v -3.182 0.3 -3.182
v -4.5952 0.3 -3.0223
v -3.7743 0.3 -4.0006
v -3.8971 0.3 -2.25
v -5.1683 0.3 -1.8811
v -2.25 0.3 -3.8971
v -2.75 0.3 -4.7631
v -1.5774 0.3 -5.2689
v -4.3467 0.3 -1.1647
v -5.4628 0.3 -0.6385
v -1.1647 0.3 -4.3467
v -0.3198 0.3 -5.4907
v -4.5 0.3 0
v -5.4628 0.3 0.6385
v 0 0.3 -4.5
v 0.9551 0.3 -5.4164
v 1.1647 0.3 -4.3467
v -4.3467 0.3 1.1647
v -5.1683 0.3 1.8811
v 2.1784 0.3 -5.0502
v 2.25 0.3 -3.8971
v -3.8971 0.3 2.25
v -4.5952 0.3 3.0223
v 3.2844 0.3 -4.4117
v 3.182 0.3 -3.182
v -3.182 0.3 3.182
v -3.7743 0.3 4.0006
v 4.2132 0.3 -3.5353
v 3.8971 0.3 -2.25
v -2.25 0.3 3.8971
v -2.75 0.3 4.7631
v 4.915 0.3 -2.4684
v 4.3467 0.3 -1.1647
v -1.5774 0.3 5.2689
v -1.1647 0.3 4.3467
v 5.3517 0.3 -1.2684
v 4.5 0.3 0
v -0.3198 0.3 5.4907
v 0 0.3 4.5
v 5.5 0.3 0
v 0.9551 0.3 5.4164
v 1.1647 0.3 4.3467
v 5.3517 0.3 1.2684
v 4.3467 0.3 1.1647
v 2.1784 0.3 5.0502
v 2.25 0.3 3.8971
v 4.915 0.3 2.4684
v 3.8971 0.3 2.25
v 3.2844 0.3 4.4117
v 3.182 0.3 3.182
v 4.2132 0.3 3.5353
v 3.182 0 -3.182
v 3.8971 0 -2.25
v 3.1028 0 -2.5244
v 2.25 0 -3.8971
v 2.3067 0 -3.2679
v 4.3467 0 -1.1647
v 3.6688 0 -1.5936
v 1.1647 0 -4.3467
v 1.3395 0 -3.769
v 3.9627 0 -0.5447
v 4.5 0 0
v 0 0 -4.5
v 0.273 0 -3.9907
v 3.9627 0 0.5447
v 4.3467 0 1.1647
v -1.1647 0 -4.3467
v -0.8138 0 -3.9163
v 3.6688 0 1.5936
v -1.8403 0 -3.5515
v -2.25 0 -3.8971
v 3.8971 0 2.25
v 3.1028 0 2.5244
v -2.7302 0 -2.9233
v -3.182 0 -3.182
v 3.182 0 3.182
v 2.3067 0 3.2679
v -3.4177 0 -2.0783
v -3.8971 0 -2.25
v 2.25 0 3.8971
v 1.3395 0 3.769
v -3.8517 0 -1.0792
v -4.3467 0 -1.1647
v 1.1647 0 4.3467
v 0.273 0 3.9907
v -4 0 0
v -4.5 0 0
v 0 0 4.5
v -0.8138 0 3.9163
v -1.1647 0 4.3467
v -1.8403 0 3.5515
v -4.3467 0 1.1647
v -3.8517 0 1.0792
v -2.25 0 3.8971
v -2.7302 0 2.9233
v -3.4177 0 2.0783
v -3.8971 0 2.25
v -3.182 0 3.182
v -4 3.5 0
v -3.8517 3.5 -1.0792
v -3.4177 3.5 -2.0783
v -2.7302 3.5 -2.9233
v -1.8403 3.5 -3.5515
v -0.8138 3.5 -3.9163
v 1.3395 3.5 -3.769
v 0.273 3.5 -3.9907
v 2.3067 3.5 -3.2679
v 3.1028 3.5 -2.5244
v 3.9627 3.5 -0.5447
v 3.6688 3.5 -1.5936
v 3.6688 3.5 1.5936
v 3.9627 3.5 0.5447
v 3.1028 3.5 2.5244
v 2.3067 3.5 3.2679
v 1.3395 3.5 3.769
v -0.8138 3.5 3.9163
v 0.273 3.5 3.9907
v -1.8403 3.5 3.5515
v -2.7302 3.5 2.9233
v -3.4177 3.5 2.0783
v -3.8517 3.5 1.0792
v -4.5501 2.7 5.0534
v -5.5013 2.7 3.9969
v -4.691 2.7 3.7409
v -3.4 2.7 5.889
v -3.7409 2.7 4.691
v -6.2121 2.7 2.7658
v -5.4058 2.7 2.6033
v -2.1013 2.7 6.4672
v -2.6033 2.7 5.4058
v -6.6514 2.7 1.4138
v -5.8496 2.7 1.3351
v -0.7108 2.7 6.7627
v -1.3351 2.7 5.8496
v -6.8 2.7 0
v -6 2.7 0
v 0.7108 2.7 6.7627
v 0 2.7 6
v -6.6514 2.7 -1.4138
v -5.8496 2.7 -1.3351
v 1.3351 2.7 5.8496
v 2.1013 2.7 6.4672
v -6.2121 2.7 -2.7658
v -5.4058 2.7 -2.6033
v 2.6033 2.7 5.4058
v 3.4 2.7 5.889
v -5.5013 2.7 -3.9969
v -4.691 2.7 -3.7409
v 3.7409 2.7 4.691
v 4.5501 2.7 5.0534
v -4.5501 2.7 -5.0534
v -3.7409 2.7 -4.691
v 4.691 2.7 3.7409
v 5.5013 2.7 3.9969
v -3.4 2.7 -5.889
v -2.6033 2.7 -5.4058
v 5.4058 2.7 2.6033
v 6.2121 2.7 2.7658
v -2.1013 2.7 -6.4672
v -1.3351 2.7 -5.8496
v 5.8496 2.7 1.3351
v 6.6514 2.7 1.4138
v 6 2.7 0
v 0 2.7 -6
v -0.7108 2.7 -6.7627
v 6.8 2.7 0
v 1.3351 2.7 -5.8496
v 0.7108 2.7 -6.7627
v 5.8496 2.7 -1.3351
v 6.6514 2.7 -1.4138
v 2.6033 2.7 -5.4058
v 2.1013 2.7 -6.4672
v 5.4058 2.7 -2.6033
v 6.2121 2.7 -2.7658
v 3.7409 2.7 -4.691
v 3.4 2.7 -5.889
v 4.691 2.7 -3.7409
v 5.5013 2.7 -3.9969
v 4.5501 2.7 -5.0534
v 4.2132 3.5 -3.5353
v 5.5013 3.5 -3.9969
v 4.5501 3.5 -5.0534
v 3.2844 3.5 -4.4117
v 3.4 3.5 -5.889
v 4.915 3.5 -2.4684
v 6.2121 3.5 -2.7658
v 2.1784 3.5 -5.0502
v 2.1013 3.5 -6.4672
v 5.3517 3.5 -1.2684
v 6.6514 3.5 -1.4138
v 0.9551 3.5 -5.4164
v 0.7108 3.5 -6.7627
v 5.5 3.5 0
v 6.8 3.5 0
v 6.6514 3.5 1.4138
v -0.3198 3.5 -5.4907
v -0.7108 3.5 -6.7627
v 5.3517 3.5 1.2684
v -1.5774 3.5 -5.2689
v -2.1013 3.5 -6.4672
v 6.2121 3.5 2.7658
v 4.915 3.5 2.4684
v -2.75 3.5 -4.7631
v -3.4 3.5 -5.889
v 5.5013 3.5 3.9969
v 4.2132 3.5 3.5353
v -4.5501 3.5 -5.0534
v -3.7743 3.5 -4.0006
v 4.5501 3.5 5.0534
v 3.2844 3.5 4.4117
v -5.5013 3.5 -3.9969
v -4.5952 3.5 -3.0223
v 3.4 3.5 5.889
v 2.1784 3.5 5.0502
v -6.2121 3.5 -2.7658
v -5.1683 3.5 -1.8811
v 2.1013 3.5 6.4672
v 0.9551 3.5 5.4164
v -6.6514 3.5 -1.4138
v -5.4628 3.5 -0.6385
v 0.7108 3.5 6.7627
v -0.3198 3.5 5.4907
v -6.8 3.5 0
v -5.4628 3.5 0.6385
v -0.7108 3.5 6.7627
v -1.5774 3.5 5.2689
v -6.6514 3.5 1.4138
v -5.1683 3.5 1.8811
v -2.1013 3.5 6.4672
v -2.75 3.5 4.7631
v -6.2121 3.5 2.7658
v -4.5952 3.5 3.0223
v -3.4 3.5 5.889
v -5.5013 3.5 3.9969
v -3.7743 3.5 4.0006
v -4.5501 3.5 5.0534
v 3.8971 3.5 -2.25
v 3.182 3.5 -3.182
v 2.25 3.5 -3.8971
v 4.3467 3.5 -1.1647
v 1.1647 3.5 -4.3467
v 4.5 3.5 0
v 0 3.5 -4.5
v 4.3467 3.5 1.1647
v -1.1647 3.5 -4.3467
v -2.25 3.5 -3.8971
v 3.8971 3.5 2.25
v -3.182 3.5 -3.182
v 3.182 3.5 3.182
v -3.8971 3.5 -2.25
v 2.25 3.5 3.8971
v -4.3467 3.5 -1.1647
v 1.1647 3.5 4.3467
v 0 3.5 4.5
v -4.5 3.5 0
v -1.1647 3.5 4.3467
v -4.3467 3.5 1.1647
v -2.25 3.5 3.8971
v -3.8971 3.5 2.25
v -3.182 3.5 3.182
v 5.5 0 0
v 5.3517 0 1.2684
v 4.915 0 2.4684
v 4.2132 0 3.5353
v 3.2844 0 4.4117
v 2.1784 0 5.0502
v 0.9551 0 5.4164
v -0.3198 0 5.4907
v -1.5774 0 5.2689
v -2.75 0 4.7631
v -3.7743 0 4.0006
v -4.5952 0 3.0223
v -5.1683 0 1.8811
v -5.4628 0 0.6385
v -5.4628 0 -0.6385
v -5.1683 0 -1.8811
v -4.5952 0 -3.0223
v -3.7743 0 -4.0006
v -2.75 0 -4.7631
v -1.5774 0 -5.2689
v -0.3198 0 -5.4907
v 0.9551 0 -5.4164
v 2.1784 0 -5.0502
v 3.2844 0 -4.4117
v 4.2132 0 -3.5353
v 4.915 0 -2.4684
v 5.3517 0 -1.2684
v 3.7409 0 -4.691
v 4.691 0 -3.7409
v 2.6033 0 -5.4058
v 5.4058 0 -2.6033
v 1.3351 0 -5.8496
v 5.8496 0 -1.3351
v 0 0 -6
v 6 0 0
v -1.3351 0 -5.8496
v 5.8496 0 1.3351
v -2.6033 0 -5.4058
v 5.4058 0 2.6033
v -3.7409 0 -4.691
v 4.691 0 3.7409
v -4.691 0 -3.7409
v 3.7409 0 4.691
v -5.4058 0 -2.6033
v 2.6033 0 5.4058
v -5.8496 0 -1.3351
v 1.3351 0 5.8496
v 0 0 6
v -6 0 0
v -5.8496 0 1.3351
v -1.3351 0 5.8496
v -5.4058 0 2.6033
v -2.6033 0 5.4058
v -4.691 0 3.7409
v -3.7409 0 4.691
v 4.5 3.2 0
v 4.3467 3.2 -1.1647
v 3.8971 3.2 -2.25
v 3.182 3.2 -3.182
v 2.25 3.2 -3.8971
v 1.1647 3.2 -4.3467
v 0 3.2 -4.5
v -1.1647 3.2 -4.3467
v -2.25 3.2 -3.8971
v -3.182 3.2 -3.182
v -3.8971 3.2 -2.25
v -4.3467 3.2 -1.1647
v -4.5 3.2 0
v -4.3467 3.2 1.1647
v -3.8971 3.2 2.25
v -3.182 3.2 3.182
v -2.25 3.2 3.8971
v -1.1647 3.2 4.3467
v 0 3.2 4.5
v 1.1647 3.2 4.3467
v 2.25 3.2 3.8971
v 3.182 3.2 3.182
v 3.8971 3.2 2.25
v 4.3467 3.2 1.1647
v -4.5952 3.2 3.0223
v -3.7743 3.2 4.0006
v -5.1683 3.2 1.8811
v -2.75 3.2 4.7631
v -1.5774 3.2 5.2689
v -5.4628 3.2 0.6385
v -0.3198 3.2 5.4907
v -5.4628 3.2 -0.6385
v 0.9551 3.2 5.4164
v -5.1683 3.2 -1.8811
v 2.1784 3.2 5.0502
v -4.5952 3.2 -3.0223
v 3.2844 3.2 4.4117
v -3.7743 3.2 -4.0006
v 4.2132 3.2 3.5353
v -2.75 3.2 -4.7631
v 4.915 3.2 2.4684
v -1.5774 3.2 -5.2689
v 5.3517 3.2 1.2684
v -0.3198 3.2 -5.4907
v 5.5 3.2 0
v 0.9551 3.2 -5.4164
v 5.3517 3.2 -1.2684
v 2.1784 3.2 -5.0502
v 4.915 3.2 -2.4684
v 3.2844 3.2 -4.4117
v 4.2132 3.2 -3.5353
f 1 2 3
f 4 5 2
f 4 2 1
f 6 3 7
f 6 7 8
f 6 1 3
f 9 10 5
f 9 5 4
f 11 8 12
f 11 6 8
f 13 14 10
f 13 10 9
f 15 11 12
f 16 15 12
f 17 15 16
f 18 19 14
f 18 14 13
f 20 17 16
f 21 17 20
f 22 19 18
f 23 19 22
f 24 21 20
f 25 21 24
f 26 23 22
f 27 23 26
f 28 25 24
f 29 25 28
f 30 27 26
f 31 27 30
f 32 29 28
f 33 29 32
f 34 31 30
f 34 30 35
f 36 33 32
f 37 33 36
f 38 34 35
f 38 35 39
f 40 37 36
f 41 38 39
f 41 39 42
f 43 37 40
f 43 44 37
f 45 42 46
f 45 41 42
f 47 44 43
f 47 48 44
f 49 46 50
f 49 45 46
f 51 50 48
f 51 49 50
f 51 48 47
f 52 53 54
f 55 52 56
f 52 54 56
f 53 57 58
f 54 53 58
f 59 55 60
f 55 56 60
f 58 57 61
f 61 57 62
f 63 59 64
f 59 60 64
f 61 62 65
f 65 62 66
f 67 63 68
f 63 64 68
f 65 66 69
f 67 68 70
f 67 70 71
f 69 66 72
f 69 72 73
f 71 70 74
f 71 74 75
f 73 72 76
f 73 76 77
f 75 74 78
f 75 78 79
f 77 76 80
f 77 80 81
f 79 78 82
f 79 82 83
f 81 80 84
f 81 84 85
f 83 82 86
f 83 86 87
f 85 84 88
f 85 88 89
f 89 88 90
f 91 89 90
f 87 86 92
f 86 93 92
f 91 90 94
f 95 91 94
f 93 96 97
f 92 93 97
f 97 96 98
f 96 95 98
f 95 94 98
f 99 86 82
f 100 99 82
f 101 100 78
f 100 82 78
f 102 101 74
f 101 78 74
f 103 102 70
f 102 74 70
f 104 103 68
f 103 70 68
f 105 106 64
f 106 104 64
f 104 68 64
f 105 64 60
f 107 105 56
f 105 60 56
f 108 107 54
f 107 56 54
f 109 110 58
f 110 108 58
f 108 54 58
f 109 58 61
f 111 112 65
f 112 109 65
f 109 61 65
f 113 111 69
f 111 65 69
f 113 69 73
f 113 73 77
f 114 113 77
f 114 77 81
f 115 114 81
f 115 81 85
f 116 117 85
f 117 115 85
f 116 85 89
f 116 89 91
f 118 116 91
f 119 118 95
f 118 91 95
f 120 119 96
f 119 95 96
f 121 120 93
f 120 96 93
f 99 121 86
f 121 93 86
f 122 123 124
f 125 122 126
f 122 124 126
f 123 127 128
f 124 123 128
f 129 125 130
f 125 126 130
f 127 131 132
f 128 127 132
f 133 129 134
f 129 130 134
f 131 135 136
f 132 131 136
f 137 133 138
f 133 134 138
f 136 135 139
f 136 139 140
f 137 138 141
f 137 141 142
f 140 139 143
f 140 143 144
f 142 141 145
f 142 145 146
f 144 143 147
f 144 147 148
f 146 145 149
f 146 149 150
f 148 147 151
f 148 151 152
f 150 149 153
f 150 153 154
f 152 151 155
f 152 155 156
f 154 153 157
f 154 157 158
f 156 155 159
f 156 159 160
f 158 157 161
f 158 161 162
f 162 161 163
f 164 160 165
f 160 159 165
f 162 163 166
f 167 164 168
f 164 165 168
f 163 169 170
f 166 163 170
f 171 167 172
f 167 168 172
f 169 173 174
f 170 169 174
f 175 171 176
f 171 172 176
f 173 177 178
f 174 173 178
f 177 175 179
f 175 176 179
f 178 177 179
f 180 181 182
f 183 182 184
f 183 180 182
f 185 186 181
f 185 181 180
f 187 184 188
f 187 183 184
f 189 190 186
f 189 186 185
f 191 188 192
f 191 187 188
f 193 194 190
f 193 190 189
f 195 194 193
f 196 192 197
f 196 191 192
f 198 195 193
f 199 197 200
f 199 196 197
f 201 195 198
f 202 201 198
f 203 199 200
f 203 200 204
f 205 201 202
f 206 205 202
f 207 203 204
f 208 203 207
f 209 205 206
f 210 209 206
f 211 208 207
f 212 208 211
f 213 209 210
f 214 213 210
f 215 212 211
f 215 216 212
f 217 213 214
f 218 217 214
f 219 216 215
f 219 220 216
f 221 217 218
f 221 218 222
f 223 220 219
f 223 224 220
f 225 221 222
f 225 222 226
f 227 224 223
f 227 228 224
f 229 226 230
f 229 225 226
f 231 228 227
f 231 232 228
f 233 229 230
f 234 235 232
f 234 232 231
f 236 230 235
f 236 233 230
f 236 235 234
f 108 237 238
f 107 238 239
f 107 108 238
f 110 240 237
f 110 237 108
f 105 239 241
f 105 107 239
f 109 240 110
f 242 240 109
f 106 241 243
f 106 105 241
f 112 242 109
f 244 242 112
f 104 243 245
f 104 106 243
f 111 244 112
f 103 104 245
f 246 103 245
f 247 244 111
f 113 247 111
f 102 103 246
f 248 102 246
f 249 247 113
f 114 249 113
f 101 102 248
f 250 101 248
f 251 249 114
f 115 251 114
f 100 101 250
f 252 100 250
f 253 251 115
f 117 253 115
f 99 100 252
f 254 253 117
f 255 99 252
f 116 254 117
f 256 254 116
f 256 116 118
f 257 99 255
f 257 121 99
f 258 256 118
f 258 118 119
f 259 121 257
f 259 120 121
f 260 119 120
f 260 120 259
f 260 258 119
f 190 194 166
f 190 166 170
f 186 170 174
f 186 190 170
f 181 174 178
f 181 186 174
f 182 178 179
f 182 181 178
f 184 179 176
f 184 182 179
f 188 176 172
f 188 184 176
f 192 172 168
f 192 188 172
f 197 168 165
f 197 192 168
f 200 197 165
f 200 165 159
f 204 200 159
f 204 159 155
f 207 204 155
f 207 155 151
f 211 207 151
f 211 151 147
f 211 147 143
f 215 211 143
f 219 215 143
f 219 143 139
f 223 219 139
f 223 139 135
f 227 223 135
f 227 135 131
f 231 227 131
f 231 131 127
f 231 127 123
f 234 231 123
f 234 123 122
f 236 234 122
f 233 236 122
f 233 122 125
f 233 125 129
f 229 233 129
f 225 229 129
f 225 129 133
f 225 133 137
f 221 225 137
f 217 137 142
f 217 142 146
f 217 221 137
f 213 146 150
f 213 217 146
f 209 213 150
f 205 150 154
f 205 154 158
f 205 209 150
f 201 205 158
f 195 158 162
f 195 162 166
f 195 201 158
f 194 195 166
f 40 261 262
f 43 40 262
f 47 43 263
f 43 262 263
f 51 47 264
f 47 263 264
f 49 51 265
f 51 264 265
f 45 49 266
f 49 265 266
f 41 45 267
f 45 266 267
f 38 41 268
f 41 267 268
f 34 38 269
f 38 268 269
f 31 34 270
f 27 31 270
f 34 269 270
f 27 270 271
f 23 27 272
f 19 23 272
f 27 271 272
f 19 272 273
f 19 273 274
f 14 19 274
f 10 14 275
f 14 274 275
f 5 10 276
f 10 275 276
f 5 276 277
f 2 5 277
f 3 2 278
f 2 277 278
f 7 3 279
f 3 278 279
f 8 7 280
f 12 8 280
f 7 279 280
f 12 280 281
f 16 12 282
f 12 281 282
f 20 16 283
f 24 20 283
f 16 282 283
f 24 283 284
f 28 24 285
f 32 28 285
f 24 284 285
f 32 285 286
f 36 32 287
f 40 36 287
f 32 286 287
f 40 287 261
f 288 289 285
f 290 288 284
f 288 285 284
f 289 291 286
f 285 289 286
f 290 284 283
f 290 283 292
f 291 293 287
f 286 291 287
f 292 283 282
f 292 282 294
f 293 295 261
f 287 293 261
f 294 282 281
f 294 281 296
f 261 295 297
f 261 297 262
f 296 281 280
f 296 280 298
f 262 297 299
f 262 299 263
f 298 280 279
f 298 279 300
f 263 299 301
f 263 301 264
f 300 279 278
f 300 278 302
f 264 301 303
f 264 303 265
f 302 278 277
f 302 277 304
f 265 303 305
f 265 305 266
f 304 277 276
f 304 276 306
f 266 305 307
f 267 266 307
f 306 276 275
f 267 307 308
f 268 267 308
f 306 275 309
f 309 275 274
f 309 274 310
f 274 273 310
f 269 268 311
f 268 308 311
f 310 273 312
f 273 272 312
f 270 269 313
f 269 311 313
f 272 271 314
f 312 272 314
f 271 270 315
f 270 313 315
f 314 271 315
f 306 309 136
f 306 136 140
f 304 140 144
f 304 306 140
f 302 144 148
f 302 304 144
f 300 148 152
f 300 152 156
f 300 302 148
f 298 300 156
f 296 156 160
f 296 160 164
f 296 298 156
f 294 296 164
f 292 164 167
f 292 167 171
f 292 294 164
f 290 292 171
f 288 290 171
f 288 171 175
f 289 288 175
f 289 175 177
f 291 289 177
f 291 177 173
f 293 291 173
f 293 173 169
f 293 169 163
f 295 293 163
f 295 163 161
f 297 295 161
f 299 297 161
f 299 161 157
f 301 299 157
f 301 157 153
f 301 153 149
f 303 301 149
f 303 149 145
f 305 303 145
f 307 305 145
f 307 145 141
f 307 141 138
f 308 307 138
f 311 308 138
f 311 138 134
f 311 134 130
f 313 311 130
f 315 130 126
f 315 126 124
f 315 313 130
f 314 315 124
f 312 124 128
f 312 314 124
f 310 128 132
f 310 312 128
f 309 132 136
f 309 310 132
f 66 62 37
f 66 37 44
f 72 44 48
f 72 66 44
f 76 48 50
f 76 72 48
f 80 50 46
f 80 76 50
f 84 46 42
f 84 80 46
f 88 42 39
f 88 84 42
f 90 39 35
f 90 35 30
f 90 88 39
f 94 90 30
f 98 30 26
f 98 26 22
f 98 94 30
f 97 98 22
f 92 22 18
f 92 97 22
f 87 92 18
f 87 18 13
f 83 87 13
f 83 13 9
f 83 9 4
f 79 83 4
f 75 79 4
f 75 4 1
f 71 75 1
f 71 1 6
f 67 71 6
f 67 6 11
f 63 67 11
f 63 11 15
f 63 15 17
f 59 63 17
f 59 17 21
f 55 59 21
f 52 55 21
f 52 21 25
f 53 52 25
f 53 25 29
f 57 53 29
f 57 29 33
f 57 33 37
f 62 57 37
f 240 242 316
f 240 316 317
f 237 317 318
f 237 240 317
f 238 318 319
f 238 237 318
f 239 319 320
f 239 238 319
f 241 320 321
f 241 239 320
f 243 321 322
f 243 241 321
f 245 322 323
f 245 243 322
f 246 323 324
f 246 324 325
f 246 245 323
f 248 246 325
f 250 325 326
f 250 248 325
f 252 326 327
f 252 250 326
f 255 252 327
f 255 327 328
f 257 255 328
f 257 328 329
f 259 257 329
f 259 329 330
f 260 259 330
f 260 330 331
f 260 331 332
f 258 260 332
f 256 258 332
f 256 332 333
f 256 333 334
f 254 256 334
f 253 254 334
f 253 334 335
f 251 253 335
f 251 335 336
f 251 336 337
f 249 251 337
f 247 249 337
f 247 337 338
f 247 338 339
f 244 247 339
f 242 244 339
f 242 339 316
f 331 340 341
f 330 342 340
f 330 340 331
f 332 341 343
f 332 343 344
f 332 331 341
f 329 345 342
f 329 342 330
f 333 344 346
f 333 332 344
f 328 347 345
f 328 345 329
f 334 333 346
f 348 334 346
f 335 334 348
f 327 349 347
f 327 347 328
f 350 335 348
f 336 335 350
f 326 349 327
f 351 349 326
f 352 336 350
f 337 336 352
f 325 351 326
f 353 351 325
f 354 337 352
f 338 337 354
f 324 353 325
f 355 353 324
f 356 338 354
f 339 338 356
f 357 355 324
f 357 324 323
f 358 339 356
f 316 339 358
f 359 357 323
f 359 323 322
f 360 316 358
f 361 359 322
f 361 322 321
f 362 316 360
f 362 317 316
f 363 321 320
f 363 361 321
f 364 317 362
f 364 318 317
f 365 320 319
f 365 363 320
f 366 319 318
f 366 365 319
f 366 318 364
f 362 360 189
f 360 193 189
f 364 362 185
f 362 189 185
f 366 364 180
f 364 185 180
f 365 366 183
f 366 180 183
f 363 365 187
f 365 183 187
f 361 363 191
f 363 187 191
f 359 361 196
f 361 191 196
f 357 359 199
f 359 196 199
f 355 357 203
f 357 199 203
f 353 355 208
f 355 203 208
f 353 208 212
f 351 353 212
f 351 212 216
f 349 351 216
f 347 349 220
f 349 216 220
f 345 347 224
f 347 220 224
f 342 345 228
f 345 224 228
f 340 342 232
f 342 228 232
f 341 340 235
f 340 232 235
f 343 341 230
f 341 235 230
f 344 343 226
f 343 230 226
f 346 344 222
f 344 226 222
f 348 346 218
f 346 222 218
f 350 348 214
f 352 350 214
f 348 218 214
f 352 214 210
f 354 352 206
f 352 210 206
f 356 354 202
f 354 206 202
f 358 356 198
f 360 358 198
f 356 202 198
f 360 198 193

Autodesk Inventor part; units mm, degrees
ref_plane "YZ Plane" through (0, 0, 0) normal (1, 0, 0) x (0, 1, 0)
ref_plane "XZ Plane" through (0, 0, 0) normal (0, 1, 0) x (-1, 0, 0)
ref_plane "XY Plane" through (0, 0, 0) normal (0, 0, 1) x (1, 0, 0)
sketch "スケッチ1" plane through (0, 0, 0) normal (0, 1, 0) x (-1, 0, 0)
  circle A0 centre (0, 0) radius 4
  circle A1 centre (0, 0) radius 6
  dimension "d0" = 8
  dimension "d1" = 12
extrude "押し出し1" add sketch "スケッチ1" along normal blind 3.5
sketch "スケッチ2" plane through (0, 3.5, 0) normal (0, 1, 0) x (1, 0, 0)
  circle A0 centre (0, 0) radius 6
  circle A1 centre (0, 0) radius 6.8
  circle A2 centre (0, 0) radius 6 projected
  dimension "d4" = 13.6
extrude "押し出し2" add sketch "スケッチ2" against normal blind 0.8
sketch "スケッチ3" plane through (0, 3.5, 0) normal (0, 1, 0) x (1, 0, 0)
  circle A0 centre (0, 0) radius 4 projected
  circle A1 centre (0, 0) radius 4.5
  circle A2 centre (0, 0) radius 5.5
  dimension "d7" = 9
  dimension "d8" = 11
extrude "押し出し3" cut sketch "スケッチ3" against normal blind 0.3 contours A2
sketch "スケッチ4" plane through (0, 0, 0) normal (0, -1, 0) x (1, 0, 0)
  circle A0 centre (0, 0) radius 4 projected
  circle A1 centre (0, 0) radius 4.5
  circle A2 centre (0, 0) radius 5.5
  dimension "d11" = 9
  dimension "d12" = 11
extrude "押し出し4" cut sketch "スケッチ4" against normal blind 0.3 contours A2
properties part number "Bearing_MF128ZZ" material "ステンレス鋼"
